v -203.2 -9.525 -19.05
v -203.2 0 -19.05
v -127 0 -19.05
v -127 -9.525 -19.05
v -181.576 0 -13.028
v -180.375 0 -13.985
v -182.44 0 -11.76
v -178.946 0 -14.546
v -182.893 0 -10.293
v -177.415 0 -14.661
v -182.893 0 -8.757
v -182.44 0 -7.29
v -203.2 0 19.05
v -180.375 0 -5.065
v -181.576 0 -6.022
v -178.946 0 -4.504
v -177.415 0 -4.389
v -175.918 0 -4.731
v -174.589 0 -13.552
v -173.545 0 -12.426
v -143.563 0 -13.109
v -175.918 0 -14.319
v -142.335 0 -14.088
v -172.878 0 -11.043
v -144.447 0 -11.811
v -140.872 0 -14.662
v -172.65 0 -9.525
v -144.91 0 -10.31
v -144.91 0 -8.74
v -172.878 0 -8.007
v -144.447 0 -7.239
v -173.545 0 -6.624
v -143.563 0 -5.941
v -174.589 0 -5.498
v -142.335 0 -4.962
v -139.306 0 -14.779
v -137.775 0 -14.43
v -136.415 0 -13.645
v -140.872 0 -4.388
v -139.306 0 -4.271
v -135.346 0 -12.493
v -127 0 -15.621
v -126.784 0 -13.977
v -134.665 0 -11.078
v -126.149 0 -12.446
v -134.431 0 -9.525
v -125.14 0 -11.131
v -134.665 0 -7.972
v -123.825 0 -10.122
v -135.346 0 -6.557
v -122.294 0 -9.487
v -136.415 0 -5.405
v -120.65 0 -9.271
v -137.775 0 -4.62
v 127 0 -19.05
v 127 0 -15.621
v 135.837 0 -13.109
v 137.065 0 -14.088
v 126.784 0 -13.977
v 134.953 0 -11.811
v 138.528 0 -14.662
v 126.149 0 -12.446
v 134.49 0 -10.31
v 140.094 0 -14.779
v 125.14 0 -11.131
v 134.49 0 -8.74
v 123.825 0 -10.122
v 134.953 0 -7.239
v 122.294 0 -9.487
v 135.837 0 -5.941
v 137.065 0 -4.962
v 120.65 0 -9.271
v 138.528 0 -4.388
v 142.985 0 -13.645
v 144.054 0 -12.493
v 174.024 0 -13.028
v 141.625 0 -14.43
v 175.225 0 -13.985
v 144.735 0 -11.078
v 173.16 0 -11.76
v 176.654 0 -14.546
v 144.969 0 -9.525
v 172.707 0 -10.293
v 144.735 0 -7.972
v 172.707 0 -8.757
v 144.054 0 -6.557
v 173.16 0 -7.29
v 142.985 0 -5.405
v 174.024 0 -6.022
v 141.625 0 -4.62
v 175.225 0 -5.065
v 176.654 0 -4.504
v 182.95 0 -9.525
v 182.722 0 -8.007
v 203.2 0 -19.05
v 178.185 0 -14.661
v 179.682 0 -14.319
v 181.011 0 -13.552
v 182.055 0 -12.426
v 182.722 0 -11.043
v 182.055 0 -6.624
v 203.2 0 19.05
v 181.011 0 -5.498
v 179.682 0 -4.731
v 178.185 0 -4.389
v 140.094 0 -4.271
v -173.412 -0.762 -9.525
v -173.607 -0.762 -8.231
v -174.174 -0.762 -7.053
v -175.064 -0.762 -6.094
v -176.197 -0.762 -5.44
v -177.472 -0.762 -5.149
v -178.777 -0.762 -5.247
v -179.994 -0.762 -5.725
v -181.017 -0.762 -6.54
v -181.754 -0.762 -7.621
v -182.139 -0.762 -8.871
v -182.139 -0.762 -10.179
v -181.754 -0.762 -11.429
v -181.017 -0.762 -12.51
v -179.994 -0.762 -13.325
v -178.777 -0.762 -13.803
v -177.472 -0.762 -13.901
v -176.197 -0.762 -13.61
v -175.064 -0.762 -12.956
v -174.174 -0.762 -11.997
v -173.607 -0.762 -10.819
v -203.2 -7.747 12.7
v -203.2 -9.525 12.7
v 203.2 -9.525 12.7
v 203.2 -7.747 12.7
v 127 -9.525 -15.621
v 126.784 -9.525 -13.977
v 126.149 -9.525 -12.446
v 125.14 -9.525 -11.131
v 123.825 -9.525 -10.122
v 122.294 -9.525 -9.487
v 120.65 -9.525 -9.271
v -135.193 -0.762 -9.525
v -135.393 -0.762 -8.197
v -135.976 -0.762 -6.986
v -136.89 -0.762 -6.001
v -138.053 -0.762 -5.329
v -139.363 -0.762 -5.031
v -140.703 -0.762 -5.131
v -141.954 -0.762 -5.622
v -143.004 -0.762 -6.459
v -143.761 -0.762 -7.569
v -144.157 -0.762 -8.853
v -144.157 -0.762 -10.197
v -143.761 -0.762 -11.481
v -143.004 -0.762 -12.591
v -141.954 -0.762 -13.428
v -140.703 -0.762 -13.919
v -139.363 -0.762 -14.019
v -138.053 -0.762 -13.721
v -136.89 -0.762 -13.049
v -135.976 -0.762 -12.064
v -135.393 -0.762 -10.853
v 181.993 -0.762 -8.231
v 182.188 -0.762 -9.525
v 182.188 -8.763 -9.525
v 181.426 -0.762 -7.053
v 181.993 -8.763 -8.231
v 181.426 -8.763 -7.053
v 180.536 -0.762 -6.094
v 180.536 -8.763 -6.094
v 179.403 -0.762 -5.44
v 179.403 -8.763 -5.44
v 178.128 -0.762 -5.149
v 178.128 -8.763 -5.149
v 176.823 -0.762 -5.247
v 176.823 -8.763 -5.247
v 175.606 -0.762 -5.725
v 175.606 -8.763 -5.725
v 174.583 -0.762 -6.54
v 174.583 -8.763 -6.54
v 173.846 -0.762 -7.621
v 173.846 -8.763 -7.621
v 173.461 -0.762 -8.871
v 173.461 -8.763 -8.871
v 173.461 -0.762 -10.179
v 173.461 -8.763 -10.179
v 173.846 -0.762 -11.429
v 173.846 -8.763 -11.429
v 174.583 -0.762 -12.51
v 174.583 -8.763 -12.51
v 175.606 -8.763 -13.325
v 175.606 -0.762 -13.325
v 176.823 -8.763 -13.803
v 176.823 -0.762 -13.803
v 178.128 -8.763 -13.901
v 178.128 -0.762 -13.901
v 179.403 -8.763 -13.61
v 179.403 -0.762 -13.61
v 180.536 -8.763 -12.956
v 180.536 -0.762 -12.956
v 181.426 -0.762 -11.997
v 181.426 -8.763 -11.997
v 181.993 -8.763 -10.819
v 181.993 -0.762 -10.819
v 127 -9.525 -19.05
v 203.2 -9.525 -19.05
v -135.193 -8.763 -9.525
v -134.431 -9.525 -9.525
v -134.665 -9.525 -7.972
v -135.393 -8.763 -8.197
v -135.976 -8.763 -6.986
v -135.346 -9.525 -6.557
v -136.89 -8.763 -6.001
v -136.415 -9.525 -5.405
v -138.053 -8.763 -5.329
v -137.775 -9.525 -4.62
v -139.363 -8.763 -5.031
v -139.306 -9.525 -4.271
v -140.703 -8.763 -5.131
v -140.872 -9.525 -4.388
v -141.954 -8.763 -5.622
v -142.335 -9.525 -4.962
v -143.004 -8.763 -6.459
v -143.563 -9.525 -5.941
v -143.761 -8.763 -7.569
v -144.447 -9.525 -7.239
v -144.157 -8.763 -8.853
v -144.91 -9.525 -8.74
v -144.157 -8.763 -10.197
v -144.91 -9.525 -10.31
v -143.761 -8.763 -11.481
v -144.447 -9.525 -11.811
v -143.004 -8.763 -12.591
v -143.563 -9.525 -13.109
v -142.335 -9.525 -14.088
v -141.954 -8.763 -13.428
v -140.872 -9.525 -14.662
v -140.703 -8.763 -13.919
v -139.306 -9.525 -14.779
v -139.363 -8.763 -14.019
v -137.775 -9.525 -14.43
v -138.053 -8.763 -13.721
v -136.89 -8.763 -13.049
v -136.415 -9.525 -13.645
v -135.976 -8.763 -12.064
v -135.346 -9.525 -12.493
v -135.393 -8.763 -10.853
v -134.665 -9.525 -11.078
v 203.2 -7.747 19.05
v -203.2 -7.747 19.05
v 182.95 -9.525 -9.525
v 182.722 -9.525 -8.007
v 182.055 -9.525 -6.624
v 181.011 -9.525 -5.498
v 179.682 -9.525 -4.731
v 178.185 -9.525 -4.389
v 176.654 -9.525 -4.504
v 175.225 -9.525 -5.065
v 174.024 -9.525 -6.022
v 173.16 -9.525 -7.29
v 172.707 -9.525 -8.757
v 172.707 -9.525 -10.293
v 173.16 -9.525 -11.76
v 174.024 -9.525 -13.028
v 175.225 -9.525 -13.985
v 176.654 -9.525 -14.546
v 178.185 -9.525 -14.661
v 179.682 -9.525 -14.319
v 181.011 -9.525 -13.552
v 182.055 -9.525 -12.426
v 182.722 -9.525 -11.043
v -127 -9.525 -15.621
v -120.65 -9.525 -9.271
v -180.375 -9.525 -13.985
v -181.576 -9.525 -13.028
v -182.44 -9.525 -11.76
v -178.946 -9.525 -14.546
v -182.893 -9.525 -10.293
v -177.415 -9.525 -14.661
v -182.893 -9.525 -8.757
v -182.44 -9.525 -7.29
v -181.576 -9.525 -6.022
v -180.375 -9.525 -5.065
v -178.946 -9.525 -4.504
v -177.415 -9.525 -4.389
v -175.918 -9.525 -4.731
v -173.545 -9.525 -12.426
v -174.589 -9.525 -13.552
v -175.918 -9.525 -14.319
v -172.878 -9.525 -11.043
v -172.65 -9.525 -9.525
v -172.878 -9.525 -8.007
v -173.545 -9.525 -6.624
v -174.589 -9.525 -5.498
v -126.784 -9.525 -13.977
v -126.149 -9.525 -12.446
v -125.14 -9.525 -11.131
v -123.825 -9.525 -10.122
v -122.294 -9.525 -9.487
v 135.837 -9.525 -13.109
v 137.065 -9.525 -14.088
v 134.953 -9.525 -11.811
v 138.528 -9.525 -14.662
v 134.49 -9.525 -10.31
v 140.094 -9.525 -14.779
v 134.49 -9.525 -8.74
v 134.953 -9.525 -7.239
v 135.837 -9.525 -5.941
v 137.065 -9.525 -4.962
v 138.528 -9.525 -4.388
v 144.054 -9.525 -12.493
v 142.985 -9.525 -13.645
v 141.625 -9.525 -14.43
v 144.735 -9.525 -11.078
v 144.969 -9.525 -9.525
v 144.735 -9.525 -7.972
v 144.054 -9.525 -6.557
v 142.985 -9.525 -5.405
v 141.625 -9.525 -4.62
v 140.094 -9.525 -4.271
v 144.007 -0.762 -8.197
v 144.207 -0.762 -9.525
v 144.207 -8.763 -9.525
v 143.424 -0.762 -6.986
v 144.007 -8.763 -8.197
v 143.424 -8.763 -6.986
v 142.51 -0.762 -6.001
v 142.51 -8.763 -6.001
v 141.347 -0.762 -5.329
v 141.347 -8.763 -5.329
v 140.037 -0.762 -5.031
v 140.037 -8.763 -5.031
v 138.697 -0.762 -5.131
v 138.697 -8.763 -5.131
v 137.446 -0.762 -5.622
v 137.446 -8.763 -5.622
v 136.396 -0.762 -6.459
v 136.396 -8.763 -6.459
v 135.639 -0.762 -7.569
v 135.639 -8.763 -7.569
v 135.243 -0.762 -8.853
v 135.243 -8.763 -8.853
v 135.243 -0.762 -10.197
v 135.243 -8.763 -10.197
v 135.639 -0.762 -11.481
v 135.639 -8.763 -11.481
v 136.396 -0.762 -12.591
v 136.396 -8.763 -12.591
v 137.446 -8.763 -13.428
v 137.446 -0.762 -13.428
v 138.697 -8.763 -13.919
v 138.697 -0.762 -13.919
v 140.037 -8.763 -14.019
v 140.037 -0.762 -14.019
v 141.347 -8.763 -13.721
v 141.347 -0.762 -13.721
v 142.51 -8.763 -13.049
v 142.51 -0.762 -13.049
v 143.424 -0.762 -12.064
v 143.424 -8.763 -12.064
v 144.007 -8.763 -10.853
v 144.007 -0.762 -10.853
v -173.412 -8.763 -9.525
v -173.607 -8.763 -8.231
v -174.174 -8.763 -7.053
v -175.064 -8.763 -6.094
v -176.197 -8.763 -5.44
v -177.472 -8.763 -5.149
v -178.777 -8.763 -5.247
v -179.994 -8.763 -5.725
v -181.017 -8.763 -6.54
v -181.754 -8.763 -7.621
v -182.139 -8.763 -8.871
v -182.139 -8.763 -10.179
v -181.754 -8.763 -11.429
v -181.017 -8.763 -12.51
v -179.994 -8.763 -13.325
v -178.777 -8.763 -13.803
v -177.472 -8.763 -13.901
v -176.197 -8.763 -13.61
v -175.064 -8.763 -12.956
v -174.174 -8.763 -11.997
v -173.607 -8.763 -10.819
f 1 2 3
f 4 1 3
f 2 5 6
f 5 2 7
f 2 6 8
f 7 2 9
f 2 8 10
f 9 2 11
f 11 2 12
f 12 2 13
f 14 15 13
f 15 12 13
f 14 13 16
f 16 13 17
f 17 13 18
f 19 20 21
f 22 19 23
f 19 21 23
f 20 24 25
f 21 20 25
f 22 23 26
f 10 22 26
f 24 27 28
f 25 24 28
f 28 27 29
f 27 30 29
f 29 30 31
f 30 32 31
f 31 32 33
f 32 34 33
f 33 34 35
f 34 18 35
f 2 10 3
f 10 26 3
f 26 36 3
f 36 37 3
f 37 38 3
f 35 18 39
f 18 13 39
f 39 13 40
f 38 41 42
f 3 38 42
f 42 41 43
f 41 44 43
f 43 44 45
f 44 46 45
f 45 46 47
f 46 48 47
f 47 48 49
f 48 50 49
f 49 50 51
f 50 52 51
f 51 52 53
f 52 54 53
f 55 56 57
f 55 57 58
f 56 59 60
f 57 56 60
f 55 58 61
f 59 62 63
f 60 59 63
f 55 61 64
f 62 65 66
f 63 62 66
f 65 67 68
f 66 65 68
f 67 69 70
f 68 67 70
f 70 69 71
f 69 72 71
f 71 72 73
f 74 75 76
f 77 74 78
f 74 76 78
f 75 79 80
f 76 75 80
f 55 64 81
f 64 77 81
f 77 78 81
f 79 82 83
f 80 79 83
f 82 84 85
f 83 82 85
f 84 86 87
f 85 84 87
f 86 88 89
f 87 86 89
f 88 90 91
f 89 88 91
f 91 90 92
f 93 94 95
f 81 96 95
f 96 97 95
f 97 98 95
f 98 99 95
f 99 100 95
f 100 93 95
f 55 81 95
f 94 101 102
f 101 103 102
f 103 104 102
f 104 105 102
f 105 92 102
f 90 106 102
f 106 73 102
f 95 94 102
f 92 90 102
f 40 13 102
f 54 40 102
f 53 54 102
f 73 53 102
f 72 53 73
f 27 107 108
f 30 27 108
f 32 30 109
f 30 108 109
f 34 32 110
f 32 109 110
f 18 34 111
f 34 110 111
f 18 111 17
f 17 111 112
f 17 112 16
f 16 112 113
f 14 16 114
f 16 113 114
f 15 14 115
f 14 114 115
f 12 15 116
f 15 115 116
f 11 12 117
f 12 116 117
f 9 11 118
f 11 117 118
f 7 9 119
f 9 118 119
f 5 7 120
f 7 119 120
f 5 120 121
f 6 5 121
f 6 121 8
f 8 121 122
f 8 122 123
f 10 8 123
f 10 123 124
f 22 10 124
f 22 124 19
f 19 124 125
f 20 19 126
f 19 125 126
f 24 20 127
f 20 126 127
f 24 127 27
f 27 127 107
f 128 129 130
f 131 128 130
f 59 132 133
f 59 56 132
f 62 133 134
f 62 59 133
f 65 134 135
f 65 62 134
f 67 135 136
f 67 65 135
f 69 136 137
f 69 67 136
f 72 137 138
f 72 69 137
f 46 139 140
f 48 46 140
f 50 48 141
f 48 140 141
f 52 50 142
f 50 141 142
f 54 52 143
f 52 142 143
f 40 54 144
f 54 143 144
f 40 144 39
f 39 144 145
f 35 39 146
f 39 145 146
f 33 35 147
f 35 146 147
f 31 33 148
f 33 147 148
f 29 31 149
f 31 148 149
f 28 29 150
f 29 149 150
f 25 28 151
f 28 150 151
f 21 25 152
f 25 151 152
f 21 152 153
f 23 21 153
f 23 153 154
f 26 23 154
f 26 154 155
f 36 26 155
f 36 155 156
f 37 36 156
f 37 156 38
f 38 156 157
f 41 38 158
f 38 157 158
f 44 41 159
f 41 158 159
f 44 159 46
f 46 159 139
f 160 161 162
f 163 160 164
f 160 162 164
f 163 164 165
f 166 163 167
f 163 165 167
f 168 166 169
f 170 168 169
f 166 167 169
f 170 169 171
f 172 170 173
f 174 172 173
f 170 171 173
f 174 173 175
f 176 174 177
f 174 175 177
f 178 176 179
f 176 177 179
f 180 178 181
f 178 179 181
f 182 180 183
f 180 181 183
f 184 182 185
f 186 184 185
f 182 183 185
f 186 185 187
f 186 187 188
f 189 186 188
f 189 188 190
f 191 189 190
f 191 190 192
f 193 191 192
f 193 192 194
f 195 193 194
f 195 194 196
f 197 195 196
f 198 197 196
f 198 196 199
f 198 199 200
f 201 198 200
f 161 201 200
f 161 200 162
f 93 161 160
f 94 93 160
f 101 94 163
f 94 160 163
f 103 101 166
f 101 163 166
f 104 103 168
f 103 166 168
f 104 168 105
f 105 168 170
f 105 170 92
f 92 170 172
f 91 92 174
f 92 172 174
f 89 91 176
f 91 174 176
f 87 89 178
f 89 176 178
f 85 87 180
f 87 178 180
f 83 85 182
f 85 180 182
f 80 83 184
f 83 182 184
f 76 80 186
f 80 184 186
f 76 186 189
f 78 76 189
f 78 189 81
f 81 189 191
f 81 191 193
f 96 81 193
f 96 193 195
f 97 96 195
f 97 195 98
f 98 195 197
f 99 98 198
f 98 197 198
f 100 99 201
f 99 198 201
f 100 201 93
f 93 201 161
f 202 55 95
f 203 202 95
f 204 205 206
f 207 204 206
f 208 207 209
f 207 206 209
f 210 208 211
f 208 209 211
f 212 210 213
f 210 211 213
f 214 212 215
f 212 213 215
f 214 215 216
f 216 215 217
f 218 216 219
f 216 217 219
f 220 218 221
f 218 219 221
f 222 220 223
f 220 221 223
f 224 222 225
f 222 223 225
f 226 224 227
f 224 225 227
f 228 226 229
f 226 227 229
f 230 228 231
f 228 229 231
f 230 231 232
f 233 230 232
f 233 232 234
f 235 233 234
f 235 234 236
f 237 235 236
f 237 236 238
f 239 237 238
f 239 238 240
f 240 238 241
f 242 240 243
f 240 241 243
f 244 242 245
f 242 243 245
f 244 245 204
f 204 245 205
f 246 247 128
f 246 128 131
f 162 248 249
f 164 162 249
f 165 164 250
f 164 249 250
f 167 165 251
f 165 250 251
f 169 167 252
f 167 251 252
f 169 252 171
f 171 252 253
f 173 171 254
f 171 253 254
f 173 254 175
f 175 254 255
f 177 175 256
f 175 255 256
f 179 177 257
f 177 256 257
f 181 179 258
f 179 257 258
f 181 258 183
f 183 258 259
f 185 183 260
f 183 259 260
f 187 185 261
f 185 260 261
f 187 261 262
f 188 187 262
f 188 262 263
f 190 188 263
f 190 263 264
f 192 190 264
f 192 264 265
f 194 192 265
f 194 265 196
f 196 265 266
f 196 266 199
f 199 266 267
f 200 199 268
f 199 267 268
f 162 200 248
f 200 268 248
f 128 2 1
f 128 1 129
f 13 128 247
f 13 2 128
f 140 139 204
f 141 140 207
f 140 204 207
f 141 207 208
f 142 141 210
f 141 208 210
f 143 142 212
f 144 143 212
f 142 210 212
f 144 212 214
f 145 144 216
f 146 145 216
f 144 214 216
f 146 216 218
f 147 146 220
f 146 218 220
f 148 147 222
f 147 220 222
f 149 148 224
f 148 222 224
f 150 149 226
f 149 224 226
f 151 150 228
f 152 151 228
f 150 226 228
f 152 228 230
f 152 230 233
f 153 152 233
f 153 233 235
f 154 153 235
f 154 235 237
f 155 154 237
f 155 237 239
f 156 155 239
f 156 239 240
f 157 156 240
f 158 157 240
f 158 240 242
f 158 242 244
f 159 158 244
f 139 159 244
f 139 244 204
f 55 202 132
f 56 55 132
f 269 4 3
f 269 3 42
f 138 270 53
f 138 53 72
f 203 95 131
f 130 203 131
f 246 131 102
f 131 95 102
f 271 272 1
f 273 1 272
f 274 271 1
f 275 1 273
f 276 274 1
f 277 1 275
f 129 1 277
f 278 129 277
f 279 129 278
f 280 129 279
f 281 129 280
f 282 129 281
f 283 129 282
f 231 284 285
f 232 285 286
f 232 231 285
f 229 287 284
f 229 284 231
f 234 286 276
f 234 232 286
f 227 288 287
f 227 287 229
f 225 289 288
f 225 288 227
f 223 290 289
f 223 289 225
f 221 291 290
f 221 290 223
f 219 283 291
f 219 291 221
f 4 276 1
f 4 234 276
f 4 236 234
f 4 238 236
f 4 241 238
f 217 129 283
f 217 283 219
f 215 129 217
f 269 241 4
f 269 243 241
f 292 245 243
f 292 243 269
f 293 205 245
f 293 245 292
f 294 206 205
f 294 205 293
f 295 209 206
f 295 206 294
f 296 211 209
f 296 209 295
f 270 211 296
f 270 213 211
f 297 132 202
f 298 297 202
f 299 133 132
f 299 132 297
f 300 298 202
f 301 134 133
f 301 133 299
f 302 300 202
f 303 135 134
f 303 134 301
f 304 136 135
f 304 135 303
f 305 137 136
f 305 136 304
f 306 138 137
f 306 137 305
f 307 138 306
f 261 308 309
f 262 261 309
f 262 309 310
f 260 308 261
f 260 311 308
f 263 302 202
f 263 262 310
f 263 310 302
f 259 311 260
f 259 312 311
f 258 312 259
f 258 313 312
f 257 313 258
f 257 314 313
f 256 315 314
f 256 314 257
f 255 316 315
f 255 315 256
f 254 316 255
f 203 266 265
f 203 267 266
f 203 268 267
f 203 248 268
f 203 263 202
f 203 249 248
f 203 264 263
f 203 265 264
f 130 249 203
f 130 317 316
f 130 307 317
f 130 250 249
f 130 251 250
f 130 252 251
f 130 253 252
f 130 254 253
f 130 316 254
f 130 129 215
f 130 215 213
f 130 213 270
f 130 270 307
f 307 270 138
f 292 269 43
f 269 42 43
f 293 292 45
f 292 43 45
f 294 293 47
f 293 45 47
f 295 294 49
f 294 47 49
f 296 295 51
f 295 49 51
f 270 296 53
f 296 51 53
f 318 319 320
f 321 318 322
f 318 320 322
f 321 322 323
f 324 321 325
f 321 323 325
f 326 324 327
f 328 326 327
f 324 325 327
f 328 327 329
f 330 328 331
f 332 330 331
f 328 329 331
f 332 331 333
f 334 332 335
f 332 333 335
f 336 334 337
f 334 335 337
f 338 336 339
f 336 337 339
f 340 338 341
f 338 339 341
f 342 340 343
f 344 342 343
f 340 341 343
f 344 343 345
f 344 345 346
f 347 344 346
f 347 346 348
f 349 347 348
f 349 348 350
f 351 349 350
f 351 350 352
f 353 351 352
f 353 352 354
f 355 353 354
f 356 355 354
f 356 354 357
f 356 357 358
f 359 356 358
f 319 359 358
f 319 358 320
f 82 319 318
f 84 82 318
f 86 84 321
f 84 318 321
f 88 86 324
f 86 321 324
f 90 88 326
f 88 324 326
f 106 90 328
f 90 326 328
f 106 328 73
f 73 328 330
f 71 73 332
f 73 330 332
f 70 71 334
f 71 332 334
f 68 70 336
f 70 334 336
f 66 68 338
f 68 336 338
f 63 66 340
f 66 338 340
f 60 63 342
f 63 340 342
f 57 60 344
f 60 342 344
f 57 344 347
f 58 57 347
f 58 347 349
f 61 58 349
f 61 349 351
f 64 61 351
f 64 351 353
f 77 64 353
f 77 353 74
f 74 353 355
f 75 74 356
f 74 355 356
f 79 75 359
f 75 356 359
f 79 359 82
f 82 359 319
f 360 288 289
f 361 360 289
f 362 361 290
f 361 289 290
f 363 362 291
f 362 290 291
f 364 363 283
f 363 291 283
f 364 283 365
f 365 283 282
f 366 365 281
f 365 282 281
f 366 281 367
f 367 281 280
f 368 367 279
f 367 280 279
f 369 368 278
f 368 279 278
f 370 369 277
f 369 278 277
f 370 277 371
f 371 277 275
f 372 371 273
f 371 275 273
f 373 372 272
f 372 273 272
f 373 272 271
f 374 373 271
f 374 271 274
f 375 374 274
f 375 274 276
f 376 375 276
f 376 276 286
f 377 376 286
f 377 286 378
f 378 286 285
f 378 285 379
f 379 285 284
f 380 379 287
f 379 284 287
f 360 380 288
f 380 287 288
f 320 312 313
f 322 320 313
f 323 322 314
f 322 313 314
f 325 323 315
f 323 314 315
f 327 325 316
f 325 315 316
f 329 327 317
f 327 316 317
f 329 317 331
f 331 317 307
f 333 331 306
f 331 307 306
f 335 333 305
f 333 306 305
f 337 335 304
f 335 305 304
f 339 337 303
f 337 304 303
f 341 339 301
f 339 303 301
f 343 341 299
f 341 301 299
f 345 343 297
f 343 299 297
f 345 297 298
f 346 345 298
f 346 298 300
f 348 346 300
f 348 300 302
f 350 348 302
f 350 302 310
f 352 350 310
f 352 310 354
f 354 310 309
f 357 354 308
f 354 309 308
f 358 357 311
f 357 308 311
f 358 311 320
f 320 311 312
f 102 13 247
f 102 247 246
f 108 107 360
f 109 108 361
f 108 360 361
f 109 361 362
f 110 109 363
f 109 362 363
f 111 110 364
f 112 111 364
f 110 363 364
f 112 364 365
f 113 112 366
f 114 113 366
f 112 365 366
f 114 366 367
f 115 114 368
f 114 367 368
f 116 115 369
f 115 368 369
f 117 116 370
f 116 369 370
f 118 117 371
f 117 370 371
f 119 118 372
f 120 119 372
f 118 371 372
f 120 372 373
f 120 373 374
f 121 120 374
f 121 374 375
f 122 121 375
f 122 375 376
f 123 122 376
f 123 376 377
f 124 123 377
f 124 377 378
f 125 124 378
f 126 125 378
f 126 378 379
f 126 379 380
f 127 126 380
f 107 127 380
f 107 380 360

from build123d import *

# Parameters (mm, degrees)
F0_W     = 406.4
F0_H     = 38.1
F1_DEPTH = 9.525
F2_W     = 254
F2_H     = 9.779
F3_DEPTH = 9.526
F4_R     = 6.35
F5_W     = 406.4
F5_H     = 6.35
F6_DEPTH = 1.778
F7_R     = 4.507099
F7_R_2   = 4.388412
F8_DEPTH = 9.526
F9_SIZE  = 0.762


with BuildPart() as f1:
    # F0 (on Front) → F1 (new body)
    with BuildSketch(Plane.XZ):
        Rectangle(F0_W, F0_H)
    extrude(amount=F1_DEPTH)

    # F2 (on face) → F3 (cut, through all)
    with BuildSketch(Plane.XZ.offset(9.525)):
        with Locations((0, -14.1605)):
            Rectangle(F2_W, F2_H)
    extrude(amount=-F3_DEPTH, mode=Mode.SUBTRACT)

    # F4
    f4_edges = [f1.edges().sort_by_distance(p)[0] for p in [
        (-127, -4.7625, -9.271),
        (127, -4.7625, -9.271),
    ]]
    fillet(f4_edges, radius=F4_R)

    # F5 (on face) → F6 (cut)
    with BuildSketch(Plane.XZ.offset(9.525)):
        with Locations((0, 15.875)):
            Rectangle(F5_W, F5_H)
    extrude(amount=-F6_DEPTH, mode=Mode.SUBTRACT)

    # F7 (on face) → F8 (cut, through all)
    with BuildSketch(Plane.XZ.offset(9.525)):
        with Locations((139.7, -9.525)):
            Circle(F7_R)
        with Locations((177.8, -9.525)):
            Circle(F7_R_2)
        with Locations((-177.8, -9.525)):
            Circle(F7_R_2)
        with Locations((-139.7, -9.525)):
            Circle(F7_R)
    extrude(amount=-F8_DEPTH, mode=Mode.SUBTRACT)

    # F9
    f9_edges = [f1.edges().sort_by_distance(p)[0] for p in [
        (-182.188412, -9.525, -9.525),
        (-144.207099, -9.525, -9.525),
        (135.192901, -9.525, -9.525),
        (173.411588, -9.525, -9.525),
        (173.411588, 0, -9.525),
        (135.192901, 0, -9.525),
        (-144.207099, 0, -9.525),
        (-182.188412, 0, -9.525),
    ]]
    chamfer(f9_edges, length=F9_SIZE)


solid = f1.part
